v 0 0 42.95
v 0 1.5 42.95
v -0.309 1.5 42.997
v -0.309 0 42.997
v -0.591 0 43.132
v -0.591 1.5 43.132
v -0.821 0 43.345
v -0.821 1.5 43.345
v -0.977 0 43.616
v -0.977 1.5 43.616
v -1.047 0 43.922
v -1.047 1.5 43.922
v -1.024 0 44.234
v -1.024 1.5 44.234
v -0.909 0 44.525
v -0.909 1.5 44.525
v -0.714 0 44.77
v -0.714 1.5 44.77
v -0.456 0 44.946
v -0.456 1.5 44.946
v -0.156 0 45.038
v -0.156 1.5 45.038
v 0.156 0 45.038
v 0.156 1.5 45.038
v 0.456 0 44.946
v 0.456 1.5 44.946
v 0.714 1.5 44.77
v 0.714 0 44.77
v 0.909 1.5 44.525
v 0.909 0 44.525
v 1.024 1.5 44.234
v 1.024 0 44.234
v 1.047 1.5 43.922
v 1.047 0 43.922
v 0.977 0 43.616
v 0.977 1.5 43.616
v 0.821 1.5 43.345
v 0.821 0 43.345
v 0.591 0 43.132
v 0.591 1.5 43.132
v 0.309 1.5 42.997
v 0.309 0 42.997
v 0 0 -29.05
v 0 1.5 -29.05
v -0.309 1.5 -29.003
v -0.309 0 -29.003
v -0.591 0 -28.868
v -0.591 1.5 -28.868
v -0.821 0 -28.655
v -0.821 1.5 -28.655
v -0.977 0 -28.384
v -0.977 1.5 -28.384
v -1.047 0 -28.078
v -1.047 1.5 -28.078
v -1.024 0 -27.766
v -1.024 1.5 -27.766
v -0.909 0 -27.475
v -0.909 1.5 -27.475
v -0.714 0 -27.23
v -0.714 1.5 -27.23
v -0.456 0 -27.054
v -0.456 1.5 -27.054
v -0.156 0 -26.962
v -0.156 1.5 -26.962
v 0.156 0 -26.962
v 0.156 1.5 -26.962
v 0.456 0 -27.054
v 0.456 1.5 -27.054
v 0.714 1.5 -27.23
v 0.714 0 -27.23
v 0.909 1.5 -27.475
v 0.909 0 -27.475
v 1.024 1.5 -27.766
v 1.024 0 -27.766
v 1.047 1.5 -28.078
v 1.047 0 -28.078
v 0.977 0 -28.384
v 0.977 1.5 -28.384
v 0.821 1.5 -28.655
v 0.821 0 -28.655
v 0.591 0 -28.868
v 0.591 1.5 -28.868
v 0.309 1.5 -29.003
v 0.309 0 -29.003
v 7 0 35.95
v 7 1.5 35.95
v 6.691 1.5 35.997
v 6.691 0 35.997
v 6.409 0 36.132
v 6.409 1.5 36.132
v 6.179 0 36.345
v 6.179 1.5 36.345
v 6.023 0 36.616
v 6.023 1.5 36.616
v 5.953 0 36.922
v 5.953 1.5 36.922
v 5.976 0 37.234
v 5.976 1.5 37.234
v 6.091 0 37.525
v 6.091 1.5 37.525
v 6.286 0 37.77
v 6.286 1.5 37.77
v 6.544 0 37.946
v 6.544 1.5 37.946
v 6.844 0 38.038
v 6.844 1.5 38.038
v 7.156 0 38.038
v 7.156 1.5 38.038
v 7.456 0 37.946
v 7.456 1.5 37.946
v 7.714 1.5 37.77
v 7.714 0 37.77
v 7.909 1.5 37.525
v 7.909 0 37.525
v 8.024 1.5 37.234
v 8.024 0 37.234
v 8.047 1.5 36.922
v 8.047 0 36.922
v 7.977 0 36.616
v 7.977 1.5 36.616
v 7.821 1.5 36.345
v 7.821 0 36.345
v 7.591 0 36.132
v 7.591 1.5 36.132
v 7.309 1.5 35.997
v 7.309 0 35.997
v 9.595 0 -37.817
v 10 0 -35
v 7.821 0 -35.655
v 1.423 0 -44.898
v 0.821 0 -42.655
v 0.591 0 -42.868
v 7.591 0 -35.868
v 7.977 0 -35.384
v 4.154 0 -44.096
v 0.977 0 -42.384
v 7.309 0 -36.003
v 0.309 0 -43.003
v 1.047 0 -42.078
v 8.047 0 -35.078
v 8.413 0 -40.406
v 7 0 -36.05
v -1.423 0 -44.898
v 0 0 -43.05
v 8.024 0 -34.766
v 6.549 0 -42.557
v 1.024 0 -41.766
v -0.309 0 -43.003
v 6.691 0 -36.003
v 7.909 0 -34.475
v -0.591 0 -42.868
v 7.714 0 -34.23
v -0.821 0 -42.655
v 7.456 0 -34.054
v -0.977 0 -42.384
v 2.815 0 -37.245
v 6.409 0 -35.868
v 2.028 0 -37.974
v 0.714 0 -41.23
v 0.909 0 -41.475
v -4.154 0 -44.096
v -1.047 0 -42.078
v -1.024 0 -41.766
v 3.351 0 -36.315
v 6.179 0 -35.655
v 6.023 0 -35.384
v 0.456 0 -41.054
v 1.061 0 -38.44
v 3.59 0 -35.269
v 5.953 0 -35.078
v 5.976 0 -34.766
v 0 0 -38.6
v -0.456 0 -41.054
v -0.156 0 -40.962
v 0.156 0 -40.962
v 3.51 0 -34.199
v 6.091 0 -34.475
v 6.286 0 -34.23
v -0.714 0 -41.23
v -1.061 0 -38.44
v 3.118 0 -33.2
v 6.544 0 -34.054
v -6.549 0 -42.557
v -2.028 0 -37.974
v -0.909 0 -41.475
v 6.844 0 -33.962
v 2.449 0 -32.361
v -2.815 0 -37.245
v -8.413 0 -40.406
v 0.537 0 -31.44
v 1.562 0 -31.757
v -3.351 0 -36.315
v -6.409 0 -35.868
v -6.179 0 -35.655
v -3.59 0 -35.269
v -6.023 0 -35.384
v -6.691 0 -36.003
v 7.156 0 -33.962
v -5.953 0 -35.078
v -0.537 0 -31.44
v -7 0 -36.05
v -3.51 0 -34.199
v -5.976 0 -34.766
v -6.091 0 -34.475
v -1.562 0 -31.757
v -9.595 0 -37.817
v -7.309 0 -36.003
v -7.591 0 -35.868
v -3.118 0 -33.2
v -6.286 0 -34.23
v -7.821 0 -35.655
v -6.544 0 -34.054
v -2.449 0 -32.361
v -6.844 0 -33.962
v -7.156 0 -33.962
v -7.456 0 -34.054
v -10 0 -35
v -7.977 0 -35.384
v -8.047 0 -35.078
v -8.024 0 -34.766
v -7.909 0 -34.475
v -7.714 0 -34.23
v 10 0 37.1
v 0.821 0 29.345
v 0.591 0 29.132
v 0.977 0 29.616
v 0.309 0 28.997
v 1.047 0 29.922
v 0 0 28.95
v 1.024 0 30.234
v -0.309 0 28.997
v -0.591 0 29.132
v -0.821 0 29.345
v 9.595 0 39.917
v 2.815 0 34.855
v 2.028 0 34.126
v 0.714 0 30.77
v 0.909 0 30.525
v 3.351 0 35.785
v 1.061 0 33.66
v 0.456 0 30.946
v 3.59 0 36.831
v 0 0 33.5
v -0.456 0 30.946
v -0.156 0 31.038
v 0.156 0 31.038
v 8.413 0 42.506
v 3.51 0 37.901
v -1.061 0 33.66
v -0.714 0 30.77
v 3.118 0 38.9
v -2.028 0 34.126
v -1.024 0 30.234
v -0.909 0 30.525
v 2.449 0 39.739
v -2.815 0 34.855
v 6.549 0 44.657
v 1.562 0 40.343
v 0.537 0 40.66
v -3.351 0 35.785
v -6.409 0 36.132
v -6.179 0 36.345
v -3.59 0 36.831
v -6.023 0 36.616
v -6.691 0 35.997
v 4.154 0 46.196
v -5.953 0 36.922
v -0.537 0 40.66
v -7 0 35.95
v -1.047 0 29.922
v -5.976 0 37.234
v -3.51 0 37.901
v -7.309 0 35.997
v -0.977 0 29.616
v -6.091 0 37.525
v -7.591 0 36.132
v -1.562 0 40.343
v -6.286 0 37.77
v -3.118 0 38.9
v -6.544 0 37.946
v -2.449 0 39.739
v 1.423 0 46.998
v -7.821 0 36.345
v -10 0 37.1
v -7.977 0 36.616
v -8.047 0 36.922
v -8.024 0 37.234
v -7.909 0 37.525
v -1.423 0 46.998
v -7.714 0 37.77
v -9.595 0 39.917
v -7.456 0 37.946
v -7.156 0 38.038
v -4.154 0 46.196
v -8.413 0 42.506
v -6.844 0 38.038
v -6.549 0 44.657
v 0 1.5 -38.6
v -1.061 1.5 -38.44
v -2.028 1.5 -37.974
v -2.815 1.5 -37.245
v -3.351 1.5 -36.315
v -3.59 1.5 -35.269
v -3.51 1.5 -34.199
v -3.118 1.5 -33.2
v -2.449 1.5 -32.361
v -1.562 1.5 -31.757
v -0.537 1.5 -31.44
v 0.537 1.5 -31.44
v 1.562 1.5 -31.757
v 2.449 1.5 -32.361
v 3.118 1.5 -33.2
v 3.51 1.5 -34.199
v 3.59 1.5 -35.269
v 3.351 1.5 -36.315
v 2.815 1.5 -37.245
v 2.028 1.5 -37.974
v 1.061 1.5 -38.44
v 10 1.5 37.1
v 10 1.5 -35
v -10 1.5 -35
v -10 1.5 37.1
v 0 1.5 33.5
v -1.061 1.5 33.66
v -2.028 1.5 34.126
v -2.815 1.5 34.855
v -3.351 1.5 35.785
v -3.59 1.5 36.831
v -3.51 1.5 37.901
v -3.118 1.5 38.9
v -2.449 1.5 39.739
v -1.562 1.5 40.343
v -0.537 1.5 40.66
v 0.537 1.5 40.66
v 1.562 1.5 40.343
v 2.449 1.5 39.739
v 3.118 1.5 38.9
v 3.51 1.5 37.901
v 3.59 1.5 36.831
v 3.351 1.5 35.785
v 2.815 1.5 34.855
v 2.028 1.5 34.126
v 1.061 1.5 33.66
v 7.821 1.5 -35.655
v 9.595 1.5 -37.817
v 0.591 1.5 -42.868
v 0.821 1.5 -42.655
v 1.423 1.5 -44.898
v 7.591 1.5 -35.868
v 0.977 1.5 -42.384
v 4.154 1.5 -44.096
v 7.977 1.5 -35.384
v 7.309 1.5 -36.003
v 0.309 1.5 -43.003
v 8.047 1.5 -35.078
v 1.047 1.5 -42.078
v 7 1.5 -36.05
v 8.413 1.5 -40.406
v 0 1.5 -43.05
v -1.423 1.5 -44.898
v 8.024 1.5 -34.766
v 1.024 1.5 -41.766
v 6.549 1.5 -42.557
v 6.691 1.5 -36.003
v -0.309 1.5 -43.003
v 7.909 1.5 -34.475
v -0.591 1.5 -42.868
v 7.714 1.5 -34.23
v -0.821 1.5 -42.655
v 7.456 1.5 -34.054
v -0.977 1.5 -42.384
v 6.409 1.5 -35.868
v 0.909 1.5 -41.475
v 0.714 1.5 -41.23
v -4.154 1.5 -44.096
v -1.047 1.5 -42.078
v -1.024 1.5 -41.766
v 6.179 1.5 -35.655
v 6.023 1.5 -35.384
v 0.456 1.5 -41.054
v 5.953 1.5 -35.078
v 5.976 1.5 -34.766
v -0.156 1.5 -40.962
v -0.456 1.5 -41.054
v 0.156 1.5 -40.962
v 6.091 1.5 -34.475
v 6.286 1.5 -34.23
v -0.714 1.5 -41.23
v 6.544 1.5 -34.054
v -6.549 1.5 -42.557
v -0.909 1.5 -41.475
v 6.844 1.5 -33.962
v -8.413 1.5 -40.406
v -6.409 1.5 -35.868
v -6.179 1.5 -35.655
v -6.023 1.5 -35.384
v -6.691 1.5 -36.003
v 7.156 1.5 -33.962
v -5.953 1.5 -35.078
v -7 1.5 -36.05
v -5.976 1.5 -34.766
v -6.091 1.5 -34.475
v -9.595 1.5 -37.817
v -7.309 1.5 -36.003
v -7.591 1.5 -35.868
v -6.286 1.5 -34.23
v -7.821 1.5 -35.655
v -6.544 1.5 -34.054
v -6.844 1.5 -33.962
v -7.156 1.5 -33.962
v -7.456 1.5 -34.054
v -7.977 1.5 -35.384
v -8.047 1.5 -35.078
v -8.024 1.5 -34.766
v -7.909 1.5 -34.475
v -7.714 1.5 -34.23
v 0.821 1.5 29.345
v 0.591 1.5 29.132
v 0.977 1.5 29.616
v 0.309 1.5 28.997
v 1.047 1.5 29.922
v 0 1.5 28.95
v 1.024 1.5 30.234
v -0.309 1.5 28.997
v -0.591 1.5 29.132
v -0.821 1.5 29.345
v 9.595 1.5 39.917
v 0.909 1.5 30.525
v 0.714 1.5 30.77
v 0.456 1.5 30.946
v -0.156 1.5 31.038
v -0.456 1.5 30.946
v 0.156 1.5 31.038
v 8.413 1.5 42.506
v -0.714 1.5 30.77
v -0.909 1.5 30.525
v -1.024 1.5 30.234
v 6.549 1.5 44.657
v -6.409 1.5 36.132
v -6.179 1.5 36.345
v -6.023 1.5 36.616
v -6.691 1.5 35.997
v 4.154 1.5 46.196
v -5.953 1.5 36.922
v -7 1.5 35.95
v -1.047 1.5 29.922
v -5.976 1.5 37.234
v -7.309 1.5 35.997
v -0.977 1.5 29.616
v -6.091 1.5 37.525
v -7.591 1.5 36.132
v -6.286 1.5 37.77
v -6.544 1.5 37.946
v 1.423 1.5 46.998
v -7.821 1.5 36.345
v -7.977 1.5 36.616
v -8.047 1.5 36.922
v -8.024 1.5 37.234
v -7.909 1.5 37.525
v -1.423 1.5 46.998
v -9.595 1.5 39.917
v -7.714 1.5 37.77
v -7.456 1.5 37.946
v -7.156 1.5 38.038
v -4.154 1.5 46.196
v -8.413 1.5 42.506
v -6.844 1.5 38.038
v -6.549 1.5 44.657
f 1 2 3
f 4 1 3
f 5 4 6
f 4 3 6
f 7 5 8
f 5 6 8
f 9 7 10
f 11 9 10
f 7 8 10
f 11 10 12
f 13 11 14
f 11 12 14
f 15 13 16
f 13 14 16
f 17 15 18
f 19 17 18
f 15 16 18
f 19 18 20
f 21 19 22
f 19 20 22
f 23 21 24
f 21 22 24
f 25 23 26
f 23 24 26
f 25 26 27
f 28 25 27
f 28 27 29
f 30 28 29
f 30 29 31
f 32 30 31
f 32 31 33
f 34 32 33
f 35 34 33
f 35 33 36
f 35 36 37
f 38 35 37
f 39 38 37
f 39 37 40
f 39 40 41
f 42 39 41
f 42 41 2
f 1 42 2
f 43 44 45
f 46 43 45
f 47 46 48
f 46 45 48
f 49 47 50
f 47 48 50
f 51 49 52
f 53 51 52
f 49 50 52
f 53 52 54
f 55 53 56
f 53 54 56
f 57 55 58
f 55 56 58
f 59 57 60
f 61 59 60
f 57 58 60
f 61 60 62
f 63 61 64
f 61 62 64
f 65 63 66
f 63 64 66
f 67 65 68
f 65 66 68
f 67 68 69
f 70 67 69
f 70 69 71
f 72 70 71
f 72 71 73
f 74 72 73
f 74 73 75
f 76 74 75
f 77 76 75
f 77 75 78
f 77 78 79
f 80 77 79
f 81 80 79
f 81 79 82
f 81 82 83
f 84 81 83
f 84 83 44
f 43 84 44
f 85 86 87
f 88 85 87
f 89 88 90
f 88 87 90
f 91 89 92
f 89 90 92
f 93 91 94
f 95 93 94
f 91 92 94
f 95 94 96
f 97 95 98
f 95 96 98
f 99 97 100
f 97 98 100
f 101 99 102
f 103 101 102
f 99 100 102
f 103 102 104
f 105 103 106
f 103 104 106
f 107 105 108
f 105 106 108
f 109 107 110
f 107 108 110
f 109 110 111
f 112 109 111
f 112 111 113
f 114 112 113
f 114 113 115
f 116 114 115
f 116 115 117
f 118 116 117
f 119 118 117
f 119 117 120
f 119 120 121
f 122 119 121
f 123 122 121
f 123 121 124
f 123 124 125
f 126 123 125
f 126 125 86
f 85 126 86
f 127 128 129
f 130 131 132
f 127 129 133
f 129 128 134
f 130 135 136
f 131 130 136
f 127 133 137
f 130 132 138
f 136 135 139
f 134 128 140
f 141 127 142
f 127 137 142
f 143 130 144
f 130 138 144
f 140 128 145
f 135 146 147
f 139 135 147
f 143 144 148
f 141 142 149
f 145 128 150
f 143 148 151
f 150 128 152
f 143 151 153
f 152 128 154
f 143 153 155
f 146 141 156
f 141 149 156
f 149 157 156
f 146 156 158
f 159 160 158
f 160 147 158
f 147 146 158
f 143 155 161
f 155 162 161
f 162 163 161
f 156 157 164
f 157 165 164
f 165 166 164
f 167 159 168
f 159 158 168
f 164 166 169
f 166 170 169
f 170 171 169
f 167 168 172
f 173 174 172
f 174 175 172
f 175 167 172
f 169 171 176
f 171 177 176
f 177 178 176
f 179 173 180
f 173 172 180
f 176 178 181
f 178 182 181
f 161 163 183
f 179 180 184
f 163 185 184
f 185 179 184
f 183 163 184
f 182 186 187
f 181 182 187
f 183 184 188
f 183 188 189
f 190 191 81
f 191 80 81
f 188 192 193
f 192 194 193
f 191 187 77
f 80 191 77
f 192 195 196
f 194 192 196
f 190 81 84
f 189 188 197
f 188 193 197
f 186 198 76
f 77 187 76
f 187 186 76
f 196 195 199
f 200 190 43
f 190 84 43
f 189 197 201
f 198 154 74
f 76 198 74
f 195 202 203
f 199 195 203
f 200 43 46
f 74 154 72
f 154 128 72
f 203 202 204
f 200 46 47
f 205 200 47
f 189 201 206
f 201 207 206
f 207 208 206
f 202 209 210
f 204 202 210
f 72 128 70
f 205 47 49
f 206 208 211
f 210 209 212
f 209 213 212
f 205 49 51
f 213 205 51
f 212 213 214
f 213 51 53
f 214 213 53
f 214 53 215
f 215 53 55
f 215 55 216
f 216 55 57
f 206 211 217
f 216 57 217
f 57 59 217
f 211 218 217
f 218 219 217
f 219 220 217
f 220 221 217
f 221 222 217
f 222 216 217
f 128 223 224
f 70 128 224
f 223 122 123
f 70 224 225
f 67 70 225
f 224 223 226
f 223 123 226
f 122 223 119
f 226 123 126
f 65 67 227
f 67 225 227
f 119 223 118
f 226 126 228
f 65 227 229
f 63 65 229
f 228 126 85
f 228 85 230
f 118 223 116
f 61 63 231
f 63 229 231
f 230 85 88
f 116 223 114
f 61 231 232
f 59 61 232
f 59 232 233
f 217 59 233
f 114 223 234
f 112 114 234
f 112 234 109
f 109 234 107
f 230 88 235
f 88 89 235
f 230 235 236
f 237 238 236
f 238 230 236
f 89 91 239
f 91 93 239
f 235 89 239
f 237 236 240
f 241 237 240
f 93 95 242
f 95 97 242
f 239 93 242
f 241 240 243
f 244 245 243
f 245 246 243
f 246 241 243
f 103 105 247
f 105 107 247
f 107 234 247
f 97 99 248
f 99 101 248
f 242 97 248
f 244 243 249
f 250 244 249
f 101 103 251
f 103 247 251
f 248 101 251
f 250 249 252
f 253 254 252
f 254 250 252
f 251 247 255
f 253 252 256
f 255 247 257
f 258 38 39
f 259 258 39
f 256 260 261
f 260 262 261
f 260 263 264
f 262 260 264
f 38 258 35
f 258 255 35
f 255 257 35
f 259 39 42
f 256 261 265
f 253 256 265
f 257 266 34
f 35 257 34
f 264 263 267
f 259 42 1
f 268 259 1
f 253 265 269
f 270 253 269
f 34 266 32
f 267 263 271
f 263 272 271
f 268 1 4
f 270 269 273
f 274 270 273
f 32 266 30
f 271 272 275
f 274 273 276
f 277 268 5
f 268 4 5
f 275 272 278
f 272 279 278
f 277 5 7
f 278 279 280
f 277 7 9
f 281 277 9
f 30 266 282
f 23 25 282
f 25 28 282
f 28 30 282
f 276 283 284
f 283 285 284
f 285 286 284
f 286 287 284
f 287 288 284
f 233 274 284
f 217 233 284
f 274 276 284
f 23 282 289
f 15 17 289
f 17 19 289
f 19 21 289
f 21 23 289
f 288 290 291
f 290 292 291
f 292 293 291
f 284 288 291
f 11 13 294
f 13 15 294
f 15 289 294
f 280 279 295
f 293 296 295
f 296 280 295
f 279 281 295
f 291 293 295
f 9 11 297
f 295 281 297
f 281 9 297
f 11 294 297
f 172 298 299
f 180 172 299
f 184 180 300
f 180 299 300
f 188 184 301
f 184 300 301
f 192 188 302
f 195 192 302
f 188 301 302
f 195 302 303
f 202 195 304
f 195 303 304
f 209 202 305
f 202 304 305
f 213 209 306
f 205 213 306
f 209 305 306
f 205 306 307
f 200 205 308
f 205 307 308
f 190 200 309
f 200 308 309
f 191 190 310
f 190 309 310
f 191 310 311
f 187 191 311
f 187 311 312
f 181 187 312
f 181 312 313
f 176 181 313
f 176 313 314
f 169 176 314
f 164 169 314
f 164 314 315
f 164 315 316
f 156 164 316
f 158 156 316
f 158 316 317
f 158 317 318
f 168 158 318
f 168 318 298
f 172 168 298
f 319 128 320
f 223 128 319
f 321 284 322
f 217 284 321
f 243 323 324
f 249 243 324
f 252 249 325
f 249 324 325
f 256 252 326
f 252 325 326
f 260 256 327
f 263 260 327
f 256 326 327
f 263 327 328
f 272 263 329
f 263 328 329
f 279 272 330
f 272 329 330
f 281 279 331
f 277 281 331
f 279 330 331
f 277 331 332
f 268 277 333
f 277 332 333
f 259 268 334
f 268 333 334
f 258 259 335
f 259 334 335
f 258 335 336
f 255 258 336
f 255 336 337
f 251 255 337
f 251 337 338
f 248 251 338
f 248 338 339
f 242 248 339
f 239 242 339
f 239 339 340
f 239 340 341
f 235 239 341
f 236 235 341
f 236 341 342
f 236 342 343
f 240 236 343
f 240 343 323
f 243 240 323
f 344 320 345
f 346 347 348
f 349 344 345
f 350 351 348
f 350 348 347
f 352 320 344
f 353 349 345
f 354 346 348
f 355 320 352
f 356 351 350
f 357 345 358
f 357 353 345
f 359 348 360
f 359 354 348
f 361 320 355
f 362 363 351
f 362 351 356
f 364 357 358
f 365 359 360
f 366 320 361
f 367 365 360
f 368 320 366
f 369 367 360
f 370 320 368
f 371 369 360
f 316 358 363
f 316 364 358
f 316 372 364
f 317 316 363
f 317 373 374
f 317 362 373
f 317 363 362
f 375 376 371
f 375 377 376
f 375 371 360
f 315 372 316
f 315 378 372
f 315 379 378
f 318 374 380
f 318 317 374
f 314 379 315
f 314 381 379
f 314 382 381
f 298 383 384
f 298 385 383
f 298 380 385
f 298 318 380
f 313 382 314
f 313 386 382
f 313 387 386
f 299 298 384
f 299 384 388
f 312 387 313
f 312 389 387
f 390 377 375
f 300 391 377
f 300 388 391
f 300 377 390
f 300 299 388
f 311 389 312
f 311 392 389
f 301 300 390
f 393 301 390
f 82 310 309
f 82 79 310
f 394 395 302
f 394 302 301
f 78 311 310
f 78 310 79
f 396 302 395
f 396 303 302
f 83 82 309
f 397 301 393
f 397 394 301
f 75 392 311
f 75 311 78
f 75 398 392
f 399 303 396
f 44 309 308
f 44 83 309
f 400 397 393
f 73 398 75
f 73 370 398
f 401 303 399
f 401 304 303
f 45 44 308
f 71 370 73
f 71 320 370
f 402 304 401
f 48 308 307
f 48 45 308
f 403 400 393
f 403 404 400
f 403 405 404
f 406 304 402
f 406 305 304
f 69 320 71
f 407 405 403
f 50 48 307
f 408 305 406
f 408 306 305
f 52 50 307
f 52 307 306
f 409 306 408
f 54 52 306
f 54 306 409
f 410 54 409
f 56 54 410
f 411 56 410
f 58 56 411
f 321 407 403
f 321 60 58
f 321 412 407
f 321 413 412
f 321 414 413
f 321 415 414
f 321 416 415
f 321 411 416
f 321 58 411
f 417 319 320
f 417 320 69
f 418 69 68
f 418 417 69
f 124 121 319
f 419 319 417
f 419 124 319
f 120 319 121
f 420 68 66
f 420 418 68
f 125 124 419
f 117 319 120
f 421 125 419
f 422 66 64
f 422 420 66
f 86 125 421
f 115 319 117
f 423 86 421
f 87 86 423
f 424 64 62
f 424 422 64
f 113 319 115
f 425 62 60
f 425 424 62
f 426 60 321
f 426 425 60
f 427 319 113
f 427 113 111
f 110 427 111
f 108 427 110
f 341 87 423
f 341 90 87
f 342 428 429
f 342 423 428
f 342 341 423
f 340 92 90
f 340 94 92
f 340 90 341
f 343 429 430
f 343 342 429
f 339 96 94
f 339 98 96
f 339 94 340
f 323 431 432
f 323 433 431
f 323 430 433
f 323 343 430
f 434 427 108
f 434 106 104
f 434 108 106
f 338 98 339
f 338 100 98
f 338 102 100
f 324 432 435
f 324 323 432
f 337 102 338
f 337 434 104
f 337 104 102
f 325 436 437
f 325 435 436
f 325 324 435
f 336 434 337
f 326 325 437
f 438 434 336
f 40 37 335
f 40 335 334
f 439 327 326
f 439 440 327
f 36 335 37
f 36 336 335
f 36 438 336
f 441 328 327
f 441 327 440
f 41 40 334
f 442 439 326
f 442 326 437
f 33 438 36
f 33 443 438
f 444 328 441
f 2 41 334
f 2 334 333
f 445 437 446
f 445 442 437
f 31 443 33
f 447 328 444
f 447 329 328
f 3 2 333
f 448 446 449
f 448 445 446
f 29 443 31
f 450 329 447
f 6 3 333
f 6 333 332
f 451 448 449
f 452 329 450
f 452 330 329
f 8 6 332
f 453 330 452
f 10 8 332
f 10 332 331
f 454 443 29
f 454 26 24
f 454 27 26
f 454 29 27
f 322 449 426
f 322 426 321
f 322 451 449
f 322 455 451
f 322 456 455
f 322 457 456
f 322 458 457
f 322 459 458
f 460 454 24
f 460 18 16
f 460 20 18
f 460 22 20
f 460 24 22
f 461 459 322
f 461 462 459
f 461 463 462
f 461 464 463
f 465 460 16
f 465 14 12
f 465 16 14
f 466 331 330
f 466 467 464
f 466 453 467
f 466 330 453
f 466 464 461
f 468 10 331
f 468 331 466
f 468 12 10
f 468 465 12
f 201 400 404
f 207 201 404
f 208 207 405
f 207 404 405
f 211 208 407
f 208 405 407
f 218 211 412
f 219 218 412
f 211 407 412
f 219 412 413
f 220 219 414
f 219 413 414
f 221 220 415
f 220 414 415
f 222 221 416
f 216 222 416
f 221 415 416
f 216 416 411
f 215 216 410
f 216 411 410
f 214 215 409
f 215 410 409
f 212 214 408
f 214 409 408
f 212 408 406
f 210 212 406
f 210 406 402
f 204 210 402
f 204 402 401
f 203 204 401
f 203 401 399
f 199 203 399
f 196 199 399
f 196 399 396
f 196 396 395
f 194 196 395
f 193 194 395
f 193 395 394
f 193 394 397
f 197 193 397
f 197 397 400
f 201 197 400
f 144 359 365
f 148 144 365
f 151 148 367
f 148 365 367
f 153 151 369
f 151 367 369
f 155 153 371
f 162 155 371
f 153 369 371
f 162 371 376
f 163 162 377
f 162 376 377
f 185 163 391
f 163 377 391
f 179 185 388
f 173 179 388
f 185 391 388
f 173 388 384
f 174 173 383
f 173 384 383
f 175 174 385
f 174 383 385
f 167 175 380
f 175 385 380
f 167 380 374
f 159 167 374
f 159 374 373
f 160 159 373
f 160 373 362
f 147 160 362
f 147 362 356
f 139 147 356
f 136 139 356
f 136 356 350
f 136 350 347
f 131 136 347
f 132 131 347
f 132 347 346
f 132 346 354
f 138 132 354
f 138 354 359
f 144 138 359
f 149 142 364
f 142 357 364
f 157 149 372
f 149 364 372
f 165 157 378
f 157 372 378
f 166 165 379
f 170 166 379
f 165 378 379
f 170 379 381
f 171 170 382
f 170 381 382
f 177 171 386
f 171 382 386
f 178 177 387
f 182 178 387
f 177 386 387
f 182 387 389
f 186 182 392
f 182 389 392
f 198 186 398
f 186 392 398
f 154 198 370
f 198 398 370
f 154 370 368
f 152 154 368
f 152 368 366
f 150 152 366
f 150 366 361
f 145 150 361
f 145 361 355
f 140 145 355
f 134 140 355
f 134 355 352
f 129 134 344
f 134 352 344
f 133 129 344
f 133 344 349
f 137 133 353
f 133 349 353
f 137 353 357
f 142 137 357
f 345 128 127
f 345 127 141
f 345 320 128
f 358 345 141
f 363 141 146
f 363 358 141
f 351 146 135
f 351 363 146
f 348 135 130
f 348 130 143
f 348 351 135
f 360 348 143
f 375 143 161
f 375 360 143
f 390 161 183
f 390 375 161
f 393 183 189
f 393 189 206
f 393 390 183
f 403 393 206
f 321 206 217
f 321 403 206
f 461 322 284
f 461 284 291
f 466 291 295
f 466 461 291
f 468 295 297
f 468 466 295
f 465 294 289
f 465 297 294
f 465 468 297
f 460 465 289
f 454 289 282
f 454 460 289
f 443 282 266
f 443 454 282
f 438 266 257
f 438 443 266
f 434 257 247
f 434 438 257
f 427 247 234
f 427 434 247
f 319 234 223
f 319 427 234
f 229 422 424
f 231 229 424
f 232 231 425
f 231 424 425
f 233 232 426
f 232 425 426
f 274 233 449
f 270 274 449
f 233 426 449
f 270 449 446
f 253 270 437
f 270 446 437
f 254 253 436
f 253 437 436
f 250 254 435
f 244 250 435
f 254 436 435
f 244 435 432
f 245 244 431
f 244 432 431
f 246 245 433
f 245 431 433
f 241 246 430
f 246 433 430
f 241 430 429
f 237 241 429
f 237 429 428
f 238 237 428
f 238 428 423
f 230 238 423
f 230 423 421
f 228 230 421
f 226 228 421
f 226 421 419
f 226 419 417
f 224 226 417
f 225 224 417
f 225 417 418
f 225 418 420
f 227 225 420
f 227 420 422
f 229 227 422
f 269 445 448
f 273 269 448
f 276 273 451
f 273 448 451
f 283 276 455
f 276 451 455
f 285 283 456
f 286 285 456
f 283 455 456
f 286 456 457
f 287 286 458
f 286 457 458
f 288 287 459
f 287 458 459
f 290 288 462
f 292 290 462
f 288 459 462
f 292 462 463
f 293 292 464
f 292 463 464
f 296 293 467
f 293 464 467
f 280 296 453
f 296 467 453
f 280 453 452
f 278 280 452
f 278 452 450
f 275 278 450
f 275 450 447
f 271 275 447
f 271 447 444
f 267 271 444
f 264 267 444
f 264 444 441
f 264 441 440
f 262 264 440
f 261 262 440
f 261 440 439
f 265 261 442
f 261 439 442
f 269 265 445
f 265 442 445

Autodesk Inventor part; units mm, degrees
ref_plane "YZ Plane" through (0, 0, 0) normal (1, 0, 0) x (0, 1, 0)
ref_plane "XZ Plane" through (0, 0, 0) normal (0, 1, 0) x (-1, 0, 0)
ref_plane "XY Plane" through (0, 0, 0) normal (0, 0, 1) x (1, 0, 0)
sketch "Sketch1" plane through (0, 0, 0) normal (0, 1, 0) x (-1, 0, 0)
  line L0 (10, -45) -> (-10, -45)
  line L1 (-10, -45) -> (-10, 47.1)
  line L2 (-10, 47.1) -> (10, 47.1)
  line L3 (10, 47.1) -> (10, -45)
  point P0 (0, 0)
  dimension "d0" = 20
  dimension "d1" = 92.1
  dimension "d2" = 45
  dimension "d3" = 10
extrude "Plate1" add sketch "Sketch1" along normal blind 1.5
sketch "Sketch2" plane through (0, 0, 0) normal (0, -1, 0) x (1, 0, 0)
  circle A0 centre (0, 42) radius 0.7835 projected
  circle A1 centre (-7, 35) radius 0.7835 projected
  circle A2 centre (0, 28) radius 0.7835 projected
  circle A3 centre (7, 35) radius 0.7835 projected
  circle A4 centre (0, -28) radius 0.7835 projected
  circle A5 centre (-7, -35) radius 0.7835 projected
  circle A6 centre (0, -42) radius 0.7835 projected
  circle A7 centre (7, -35) radius 0.7835 projected
  circle A8 centre (-7, 37) radius 0.7835
  circle A9 centre (0, 30) radius 0.7835
  circle A10 centre (0, 44) radius 0.7835
  circle A11 centre (7, 37) radius 0.7835
  point P0 (0, 0)
hole "Hole1" at (-7, 0, -35) at (7, 0, -35) at (0, 0, -42) at (0, 0, -28) at (7, 0, 37) at (0, 0, 44) at (-7, 0, 37) at (0, 0, 30) direction (0, 1, 0) diameter 2.1 depth 1.5
sketch "Sketch3" plane through (0, 1.5, 0) normal (0, 1, 0) x (1, 0, 0)
  arc A0 (10, 35) -> (-10, 35) centre (0, 35) ccw
  arc A1 (-10, -37.1) -> (10, -37.1) centre (0, -37.1) ccw
  line L0 (-10, 35) -> (-10, -37.1)
  line L1 (10, 35) -> (10, -37.1)
  line L2 (10, 45) -> (10, -47.1) projected
  line L3 (-10, 45) -> (10, 45)
  line L4 (10, 45) -> (10, -47.1)
  line L5 (10, -47.1) -> (-10, -47.1)
  line L6 (-10, -47.1) -> (-10, 45)
  point P0 (0, 0)
  point P1 (0, 45)
  point P2 (10, 45)
  point P3 (10, 35)
  point P4 (-10, -37.1)
  point P5 (0, -47.1)
  point P6 (10, -37.1)
  point P7 (1.4107, 44.9)
  point P8 (10, 35)
  point P9 (10, -37.1)
  dimension "d12" = 35
  dimension "d13" = 37.1
  dimension "d14" = 10
  dimension "d15" = 10
  dimension "d16" = 10
  dimension "d17" = 20
  dimension "d18" = 92.1
extrude "Extrusion1" cut sketch "Sketch3" against normal blind 10 contours A0 L3 L2 | A0 L6 L3 | L2 L5 A1 | L5 L6 A1
sketch "Sketch4" plane through (0, 0, 0) normal (0, -1, 0) x (1, 0, 0)
  arc A0 (-10, -35) -> (10, -35) centre (0, -35) ccw projected
  arc A1 (10, 37.1) -> (-10, 37.1) centre (0, 37.1) ccw projected
  point P0 (0, 0)
hole "Hole2" at (0, 0, 37.1) at (0, 0, -35) direction (0, 1, 0) diameter 7.2 depth 1.5
equation "\"d10\" = Thickness"
equation "\"d26\" = Thickness"
equation "\"d4\" = Thickness"
equation "\"BendReliefWidth\" = Thickness"
equation "\"BendReliefDepth\" = 0.5 * Thickness"
equation "\"CornerReliefSize\" = 4 * Thickness"
equation "\"MinimumRemnant\" = 2 * Thickness"
equation "\"TransitionRadius\" = BendRadius"
equation "\"JacobiRadiusSize\" = BendRadius"
equation "\"GapSize\" = Thickness"
equation "\"Thickness\" = 1.5"
equation "\"BendRadius\" = 0.31"
properties part number "axis_10_11-connector_frame" material "Aluminum 6061-AHC"
